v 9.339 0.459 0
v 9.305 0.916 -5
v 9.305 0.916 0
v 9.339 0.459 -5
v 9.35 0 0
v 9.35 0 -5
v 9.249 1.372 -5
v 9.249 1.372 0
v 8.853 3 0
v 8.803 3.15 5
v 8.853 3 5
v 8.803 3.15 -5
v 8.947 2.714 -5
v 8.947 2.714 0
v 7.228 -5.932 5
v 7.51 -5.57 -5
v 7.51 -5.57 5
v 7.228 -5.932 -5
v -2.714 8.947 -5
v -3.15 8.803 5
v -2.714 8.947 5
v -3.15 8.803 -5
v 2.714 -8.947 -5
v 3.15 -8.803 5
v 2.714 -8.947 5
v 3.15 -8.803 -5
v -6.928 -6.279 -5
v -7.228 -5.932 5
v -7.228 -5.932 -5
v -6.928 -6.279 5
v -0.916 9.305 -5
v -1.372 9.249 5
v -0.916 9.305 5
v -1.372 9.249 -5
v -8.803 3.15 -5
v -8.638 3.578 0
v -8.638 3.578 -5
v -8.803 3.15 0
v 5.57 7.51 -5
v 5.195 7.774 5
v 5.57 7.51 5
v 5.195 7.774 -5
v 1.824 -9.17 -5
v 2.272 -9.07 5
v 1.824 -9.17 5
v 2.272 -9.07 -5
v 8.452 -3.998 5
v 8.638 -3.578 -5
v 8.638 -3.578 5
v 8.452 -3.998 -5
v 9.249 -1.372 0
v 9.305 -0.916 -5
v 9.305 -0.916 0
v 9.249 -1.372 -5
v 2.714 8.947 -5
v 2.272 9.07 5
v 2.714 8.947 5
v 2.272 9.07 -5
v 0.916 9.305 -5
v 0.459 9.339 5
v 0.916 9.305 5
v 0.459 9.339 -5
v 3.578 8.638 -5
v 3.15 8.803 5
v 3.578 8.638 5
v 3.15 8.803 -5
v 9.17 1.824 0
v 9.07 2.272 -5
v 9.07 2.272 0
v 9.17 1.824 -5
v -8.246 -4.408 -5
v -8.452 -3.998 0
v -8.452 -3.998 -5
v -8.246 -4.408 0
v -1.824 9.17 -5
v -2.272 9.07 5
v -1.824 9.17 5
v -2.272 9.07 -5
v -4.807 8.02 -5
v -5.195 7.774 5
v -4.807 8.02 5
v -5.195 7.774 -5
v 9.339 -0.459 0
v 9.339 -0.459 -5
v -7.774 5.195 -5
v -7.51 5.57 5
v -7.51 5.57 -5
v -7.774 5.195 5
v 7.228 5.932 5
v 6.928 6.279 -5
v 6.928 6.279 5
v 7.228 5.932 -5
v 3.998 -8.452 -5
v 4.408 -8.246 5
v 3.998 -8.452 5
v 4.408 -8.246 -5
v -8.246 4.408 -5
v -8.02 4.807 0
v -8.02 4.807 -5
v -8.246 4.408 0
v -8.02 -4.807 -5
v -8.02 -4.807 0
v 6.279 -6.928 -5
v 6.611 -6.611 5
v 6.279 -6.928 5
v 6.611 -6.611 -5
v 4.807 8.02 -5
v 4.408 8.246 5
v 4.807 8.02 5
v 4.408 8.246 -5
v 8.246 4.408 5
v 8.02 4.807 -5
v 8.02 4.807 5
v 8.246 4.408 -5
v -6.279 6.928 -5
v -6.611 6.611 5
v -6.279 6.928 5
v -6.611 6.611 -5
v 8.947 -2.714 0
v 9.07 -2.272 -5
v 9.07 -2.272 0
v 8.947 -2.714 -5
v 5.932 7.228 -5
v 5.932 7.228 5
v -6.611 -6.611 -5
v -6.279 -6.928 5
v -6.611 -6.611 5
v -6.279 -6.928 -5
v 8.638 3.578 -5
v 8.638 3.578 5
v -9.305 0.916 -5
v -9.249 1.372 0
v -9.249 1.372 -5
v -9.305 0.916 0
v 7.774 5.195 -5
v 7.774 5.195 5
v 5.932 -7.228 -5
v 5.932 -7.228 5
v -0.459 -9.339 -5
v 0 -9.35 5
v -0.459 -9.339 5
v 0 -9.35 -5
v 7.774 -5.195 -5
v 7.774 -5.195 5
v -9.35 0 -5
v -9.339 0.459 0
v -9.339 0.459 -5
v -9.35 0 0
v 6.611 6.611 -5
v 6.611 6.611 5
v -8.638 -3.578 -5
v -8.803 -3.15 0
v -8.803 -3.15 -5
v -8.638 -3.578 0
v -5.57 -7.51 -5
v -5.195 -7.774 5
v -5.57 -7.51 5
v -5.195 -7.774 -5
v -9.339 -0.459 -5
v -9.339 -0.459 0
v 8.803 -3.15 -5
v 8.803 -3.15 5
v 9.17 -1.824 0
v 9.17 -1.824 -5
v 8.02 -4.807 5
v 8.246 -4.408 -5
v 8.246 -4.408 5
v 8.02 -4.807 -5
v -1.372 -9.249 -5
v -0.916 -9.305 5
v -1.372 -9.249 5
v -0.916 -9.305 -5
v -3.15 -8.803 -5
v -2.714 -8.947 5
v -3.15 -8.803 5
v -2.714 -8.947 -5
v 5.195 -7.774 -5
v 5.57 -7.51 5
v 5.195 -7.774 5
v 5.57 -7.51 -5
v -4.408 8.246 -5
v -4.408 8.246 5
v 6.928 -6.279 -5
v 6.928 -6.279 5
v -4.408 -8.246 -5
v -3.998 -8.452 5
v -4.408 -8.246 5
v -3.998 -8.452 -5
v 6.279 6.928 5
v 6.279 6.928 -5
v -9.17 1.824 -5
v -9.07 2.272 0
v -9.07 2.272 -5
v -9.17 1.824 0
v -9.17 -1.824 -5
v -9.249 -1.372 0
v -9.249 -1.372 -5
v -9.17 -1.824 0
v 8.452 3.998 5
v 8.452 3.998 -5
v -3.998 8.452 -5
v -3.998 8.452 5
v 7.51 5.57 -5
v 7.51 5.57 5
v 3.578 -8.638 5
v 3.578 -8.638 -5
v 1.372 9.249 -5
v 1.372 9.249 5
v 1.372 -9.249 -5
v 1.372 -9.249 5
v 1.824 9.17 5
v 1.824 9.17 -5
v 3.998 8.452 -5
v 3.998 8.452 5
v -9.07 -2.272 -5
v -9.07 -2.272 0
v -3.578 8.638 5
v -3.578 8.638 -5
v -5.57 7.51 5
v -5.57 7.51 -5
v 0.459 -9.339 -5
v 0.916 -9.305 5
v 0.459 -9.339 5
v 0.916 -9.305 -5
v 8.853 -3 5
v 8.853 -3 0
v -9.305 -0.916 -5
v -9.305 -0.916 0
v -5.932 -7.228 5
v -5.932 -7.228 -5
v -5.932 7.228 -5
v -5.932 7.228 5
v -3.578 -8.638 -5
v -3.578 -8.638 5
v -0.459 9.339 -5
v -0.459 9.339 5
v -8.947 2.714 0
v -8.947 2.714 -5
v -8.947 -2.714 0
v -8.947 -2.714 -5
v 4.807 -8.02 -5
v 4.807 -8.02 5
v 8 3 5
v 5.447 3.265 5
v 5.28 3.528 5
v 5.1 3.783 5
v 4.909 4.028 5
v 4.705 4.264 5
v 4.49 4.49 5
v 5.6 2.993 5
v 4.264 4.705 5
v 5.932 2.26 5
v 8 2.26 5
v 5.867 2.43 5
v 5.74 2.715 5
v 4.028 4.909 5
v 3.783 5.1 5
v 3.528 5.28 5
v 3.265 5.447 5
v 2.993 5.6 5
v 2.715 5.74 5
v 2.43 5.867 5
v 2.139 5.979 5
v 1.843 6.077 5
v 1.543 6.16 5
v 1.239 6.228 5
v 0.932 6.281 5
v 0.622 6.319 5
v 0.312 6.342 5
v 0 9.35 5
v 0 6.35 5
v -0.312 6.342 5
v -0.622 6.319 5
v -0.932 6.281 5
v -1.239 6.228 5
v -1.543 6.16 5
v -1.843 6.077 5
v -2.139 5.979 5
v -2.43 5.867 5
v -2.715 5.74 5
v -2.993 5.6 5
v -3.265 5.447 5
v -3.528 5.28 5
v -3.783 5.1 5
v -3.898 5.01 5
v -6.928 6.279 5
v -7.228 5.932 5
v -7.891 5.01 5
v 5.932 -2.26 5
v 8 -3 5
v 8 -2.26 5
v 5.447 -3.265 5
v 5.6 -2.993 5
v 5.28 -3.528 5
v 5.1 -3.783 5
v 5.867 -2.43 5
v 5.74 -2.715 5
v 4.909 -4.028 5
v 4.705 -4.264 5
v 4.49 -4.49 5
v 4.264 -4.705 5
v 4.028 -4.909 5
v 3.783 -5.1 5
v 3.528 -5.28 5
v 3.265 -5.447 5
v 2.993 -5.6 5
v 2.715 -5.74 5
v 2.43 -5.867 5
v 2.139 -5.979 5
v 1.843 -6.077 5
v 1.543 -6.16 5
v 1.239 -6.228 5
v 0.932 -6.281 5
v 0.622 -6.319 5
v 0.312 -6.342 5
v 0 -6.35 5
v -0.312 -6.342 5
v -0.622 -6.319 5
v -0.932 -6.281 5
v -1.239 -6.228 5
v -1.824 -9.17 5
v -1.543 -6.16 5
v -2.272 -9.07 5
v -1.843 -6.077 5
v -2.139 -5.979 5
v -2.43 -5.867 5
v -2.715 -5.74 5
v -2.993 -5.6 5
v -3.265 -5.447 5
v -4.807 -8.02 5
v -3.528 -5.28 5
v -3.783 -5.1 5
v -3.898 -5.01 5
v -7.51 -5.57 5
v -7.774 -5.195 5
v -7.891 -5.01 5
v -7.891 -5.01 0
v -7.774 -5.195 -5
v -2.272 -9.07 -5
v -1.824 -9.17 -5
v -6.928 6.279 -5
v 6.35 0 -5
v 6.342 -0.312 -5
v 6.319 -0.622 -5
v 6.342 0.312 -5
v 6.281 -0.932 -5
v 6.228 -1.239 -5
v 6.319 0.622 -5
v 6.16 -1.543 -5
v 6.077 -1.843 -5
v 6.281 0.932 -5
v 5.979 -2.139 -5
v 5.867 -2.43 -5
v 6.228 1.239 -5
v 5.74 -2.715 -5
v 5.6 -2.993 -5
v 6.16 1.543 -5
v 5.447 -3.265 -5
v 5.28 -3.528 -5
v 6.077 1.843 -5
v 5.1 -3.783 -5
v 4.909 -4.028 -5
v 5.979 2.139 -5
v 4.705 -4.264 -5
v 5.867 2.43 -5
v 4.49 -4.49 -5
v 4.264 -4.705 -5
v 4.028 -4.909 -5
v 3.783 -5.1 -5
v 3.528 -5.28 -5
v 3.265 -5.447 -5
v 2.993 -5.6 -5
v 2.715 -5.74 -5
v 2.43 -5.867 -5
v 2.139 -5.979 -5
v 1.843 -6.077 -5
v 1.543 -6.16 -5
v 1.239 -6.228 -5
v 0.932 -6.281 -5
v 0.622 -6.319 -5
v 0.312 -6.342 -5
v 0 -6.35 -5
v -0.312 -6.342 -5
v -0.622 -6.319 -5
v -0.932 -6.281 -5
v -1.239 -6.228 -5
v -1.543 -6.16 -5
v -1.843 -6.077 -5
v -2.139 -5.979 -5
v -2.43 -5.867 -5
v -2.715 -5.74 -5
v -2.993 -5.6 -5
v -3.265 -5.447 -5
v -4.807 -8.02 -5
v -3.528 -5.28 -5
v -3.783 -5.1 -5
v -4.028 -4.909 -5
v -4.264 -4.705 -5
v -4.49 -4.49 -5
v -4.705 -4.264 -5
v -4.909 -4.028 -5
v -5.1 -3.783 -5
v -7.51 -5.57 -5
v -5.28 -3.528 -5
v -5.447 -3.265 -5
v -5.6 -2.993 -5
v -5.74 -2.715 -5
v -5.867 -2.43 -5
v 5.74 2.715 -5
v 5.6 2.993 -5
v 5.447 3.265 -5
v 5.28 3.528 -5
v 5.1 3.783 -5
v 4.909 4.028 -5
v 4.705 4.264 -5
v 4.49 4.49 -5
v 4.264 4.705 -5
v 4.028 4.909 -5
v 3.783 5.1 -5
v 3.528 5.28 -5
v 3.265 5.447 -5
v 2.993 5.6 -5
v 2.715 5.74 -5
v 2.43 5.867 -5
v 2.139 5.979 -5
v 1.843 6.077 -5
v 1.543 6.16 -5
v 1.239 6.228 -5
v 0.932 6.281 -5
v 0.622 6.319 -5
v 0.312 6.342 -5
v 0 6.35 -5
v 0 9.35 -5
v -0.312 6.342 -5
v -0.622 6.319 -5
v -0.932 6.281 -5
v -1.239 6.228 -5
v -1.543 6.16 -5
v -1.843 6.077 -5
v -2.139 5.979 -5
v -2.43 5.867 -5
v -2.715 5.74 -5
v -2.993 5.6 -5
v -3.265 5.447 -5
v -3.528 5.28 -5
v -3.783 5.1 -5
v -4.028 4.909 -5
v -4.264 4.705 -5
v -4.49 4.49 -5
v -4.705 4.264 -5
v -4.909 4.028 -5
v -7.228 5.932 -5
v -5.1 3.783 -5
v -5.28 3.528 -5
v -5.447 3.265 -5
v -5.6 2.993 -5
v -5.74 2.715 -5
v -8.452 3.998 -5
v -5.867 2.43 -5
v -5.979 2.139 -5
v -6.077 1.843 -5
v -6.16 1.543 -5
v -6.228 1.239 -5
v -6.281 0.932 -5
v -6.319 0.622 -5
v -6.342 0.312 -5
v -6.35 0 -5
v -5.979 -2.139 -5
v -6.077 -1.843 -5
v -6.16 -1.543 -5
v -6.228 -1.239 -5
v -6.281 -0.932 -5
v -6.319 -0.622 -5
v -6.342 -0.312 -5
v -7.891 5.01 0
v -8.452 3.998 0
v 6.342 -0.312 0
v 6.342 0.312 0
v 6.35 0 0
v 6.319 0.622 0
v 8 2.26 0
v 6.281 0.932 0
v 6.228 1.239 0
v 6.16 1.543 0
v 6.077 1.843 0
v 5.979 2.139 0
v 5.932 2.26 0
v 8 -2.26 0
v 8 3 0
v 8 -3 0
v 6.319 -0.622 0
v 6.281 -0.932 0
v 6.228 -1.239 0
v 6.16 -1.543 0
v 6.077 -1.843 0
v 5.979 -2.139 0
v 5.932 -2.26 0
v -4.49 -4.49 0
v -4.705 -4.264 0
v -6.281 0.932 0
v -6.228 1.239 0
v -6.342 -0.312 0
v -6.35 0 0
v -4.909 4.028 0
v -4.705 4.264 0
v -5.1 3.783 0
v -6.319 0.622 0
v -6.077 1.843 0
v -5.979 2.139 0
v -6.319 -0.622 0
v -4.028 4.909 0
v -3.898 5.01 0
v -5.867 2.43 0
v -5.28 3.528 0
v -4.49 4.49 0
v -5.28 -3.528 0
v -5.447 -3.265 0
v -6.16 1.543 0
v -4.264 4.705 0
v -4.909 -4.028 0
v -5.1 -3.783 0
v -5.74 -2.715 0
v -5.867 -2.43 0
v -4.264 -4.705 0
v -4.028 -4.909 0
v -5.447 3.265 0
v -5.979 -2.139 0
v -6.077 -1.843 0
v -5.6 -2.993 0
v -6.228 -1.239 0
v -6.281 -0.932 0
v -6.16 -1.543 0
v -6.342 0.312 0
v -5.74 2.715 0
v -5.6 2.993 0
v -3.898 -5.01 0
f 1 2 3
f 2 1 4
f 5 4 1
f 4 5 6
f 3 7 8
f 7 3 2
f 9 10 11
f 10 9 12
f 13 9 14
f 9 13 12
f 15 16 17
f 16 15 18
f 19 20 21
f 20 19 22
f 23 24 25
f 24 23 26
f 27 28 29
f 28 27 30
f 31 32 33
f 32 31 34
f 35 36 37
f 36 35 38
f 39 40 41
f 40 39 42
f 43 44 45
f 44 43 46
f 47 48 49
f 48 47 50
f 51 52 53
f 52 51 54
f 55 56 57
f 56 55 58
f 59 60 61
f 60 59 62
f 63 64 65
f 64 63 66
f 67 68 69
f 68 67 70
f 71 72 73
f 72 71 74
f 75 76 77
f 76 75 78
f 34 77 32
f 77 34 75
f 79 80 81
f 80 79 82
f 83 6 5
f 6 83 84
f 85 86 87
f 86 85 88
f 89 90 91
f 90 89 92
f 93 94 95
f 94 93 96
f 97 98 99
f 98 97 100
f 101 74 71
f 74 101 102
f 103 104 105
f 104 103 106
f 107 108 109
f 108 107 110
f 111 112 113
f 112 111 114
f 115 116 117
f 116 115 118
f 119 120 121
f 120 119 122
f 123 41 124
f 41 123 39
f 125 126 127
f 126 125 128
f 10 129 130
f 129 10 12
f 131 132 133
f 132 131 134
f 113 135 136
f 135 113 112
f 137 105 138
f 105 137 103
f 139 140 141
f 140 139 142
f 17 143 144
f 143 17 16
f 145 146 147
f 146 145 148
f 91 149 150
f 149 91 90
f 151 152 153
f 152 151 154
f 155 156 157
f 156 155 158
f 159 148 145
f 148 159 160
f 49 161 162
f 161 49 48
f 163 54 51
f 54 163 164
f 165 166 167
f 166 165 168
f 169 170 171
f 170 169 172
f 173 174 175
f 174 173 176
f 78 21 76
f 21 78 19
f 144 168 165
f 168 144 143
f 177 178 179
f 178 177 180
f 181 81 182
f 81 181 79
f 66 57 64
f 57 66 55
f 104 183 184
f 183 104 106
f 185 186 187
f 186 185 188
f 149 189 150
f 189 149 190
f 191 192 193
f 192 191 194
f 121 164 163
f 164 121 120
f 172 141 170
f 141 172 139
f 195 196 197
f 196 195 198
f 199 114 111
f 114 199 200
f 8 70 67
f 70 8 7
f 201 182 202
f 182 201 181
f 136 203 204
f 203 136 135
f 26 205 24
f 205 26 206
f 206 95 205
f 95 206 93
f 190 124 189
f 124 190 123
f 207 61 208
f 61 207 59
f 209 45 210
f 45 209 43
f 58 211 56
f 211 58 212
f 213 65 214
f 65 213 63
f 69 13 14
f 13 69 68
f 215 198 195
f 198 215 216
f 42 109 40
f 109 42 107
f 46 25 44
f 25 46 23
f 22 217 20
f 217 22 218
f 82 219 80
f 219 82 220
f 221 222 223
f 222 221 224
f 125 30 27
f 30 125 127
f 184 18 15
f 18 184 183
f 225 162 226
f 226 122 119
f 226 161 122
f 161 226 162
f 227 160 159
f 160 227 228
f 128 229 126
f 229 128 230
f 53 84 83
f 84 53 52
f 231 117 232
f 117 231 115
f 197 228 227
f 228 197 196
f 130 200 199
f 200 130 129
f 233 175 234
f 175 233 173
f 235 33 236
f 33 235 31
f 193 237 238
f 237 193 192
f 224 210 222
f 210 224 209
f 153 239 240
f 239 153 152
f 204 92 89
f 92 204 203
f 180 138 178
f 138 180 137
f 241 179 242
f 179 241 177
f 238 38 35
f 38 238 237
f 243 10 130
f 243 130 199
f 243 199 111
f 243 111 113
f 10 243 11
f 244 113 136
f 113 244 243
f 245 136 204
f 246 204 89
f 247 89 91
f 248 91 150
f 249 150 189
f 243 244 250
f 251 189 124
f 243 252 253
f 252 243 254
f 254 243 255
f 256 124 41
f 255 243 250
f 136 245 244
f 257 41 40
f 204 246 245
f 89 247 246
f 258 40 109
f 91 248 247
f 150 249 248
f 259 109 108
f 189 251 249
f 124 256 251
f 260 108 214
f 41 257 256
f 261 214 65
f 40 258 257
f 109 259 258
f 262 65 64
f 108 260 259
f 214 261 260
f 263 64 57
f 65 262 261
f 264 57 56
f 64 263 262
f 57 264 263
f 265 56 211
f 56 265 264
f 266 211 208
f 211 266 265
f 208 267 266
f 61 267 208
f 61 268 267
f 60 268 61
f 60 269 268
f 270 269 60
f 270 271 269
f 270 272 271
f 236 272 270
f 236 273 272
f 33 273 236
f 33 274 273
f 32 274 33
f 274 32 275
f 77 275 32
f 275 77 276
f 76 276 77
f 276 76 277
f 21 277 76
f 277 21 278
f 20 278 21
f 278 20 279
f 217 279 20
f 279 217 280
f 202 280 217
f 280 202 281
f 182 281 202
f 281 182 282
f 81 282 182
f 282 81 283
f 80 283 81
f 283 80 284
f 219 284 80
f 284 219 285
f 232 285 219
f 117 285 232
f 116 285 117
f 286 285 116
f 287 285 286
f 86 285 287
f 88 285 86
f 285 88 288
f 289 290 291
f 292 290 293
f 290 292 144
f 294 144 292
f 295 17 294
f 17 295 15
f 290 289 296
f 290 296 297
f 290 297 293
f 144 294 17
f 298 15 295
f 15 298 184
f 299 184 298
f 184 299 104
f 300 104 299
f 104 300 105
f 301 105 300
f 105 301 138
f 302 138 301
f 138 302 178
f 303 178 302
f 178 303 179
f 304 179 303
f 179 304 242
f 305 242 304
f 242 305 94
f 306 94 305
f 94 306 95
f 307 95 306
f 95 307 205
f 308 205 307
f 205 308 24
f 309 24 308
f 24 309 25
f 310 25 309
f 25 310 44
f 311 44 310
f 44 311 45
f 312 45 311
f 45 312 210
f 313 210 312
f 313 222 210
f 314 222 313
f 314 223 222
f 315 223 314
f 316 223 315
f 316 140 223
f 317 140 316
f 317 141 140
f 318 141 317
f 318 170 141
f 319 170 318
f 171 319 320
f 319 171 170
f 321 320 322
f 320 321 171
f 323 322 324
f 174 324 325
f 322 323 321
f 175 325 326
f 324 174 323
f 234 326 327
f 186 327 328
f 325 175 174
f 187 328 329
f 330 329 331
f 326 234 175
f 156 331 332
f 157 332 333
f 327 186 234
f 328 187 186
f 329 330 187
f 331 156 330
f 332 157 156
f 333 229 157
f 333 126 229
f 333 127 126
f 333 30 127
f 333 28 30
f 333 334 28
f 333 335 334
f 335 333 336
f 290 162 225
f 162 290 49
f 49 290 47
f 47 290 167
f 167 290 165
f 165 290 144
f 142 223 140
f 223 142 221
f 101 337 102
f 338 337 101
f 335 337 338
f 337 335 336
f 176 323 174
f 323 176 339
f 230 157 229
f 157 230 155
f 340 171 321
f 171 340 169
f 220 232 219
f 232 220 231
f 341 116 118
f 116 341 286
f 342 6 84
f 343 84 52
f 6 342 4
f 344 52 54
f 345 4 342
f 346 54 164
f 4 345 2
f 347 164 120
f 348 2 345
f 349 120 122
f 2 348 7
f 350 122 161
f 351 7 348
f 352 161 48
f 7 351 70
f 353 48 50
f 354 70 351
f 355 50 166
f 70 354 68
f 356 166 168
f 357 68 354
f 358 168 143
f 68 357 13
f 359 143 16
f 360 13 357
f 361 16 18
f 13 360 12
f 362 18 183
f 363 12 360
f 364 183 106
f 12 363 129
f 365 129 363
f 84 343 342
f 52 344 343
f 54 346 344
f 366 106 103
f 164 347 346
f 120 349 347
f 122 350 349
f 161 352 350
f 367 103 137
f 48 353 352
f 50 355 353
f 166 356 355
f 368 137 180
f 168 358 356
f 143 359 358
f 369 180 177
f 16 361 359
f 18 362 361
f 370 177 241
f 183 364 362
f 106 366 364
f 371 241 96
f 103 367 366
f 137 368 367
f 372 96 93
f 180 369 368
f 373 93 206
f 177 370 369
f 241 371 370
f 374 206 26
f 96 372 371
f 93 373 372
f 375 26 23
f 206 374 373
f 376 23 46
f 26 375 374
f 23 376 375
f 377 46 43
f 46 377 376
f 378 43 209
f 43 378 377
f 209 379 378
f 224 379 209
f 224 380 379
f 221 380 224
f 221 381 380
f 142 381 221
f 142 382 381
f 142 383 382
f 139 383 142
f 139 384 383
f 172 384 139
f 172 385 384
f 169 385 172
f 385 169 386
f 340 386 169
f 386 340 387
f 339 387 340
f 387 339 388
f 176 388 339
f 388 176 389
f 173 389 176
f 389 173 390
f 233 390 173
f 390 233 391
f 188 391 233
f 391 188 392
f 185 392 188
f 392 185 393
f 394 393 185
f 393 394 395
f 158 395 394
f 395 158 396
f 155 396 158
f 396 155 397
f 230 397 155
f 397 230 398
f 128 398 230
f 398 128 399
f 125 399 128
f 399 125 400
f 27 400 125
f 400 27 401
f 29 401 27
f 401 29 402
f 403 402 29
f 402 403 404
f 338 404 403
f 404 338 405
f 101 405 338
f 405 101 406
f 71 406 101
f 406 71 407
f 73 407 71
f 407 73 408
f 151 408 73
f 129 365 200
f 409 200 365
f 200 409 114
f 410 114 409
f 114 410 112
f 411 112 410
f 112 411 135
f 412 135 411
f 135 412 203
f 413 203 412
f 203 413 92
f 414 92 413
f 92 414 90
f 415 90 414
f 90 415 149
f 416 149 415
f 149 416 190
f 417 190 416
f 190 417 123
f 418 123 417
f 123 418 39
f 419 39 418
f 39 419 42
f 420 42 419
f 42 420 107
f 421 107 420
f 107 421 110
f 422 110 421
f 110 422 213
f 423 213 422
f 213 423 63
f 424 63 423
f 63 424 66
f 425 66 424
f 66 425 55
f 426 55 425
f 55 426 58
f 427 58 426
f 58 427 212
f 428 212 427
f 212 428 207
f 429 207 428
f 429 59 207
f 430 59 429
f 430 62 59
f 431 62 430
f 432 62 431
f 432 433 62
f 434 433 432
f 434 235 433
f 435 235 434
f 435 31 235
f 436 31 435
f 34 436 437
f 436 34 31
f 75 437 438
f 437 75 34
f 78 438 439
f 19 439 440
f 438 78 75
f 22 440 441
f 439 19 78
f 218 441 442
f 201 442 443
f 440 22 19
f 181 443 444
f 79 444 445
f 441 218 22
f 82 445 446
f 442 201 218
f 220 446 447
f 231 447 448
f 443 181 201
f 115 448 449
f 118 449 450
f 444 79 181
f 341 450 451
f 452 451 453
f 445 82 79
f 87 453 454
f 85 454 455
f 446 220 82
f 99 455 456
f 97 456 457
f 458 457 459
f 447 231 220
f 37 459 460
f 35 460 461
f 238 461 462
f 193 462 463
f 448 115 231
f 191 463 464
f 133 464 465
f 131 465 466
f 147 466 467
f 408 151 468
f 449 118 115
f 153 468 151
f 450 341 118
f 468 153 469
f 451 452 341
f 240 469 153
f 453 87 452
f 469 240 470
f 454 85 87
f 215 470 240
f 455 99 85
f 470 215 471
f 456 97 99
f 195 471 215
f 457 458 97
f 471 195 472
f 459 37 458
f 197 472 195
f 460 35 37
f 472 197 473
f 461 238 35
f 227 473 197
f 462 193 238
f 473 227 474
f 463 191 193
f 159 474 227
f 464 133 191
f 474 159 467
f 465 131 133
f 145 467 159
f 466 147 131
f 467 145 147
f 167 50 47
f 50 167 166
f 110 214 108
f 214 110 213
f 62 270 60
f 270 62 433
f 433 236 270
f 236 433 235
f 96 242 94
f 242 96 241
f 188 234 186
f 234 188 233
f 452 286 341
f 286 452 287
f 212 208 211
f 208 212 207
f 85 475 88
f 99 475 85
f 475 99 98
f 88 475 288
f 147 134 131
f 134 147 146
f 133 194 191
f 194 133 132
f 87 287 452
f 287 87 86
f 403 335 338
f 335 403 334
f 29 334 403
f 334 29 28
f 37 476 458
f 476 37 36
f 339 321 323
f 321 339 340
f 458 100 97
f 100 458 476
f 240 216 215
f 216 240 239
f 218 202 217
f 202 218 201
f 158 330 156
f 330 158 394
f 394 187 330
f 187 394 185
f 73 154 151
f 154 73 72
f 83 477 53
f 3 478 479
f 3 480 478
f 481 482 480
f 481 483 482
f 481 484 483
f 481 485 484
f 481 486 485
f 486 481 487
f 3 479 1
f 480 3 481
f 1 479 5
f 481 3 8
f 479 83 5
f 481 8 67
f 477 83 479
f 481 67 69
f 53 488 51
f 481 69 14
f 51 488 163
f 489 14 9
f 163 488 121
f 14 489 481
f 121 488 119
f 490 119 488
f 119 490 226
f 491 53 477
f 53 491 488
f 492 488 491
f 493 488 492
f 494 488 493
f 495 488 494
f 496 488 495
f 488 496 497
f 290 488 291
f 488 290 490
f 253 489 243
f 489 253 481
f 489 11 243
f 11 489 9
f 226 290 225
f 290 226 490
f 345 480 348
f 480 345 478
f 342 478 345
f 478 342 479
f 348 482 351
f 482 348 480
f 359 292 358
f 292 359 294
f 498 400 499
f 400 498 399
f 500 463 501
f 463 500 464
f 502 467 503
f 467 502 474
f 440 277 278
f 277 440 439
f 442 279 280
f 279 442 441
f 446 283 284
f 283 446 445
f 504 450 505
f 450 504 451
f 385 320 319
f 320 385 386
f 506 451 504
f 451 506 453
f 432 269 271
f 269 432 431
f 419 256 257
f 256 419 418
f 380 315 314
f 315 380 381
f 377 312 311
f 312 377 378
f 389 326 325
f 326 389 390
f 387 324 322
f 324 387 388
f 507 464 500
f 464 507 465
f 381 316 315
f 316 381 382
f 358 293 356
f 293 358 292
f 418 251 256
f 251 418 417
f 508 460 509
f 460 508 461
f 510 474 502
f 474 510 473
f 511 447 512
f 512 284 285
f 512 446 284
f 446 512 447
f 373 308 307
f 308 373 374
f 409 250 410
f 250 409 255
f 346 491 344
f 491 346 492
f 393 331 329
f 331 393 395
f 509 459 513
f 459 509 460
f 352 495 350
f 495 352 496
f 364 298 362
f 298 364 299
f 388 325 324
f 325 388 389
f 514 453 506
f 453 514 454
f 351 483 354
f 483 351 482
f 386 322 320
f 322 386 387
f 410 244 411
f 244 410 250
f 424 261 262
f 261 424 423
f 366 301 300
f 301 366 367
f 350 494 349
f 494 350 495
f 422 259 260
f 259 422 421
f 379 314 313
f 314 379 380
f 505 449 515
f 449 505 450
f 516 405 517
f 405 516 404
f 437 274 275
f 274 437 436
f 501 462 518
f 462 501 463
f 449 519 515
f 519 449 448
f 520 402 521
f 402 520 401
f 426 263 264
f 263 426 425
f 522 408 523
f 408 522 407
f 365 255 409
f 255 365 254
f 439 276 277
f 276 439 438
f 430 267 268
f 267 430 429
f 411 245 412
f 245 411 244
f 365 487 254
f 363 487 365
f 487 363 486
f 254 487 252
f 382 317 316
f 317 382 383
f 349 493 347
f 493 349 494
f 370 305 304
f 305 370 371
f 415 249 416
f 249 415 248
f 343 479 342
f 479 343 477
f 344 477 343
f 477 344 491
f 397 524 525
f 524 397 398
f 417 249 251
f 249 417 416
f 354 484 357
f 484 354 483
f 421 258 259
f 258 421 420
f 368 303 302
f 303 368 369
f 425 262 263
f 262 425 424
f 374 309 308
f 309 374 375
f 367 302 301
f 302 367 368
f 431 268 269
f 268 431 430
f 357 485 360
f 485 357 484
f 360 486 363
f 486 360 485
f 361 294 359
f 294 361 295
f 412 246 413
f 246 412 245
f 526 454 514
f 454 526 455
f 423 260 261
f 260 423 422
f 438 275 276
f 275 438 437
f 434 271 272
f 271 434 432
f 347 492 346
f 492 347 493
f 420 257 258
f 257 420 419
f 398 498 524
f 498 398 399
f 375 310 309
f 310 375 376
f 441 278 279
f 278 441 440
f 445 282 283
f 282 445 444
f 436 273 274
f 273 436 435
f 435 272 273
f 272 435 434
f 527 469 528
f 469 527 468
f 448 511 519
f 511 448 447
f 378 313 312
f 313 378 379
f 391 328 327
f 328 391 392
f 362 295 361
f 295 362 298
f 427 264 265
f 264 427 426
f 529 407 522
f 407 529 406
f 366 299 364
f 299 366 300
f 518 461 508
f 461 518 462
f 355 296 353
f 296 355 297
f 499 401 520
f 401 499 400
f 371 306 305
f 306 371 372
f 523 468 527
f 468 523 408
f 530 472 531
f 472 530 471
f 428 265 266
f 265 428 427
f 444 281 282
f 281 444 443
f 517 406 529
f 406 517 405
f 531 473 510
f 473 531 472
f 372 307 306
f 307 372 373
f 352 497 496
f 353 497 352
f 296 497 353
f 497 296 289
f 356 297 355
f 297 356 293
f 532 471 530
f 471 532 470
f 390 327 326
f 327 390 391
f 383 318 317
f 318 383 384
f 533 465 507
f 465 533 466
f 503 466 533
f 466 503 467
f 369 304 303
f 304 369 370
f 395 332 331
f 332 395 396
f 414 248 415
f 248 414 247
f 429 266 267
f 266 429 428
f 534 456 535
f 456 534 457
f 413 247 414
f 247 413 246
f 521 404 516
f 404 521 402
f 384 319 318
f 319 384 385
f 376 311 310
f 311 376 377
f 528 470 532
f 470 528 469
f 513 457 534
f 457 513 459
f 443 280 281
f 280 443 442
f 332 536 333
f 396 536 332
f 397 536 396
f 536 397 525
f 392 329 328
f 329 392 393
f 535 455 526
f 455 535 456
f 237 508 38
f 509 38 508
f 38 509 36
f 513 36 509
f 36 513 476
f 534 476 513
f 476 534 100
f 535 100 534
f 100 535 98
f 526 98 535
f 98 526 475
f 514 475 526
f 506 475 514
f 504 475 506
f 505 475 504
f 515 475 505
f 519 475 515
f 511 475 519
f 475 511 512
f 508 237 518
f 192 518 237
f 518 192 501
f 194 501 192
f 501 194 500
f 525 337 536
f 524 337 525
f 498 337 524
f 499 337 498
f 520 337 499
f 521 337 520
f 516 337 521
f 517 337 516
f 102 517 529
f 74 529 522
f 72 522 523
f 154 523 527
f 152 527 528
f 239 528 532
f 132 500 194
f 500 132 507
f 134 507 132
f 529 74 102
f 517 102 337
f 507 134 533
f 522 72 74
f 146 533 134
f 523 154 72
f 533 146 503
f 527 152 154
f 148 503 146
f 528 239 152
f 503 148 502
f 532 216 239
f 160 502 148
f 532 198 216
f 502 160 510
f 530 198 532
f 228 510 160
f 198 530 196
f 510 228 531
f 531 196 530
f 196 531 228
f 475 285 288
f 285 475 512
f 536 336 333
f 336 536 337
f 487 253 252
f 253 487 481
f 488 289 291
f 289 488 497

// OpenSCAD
// Snap-on Clip for Lab Stand Rod and Tubing (Corrected)
// Orientation: Flat on XY plane, building upward (+Z)
// Units: Millimetres

// --- Dimensions ---
// Rod Stand Dimensions
$rod_diameter = 12.7;
$rod_wall_thickness = 3;
$rod_outer_diameter = $rod_diameter + 2 * $rod_wall_thickness; // 18.7
$rod_ring_height = 10;

// Tubing Dimensions
$tubing_diameter = 6;
$tubing_wall_thickness = 2;
$tubing_outer_diameter = $tubing_diameter + 2 * $tubing_wall_thickness; // 8
$tubing_ring_height = 10;

// Positioning
$rod_center_x = 0;
$rod_center_y = 0;
$tubing_center_x = 15;
$tubing_center_y = 0;

// Bridge Dimensions
$bridge_width_x = 4; // From x=8 to x=12
$bridge_width_y = 6;
$bridge_height = 10;
$bridge_start_x = 8;
$bridge_end_x = 12;

// Cutout Dimensions
// Rod cutout: 10mm wide, centered at y=0, on -X side
$rod_cutout_width = 10;
$rod_cutout_half_y = $rod_cutout_width / 2; // 5

// Tubing cutout: 4.5mm wide, centered at y=0, on +X side
$tubing_cutout_width = 4.5;
$tubing_cutout_half_y = $tubing_cutout_width / 2; // 2.25

// --- Configuration ---
$fn = 128; // High resolution for smooth curves and accurate hole sizes

// --- Main Body Construction ---
difference() {
    // 1. Create the solid base profile (Outer Rings + Bridge)
    // All objects are now at Z=0
    
    // Rod Outer Ring
    translate([0, 0, 0]) {
        cylinder(h = $rod_ring_height, d = $rod_outer_diameter, center = true);
    }
    
    // Tubing Outer Ring
    translate([$tubing_center_x, $tubing_center_y, 0]) {
        cylinder(h = $tubing_ring_height, d = $tubing_outer_diameter, center = true);
    }
    
    // Solid Bridge
    // Positioned at x=8 to x=12, y=-3 to y=3, z=0 to z=10
    translate([$bridge_start_x, -($bridge_width_y/2), 0]) {
        cube([$bridge_width_x, $bridge_width_y, $bridge_height]);
    }
    
    // 2. Cut out the Rod Hole (Inner Cylinder)
    // Extend slightly past the top and bottom faces to ensure clean cut
    translate([0, 0, -0.01]) 
        cylinder(h = $rod_ring_height + 0.02, d = $rod_diameter, center = true);
    
    // 3. Cut out the Tubing Hole (Inner Cylinder)
    // Extend slightly past the top and bottom faces to ensure clean cut
    translate([$tubing_center_x, $tubing_center_y, -0.01]) 
        cylinder(h = $tubing_ring_height + 0.02, d = $tubing_diameter, center = true);
    
    // 4. Cut out Rod Rectangular Opening (-X side)
    // Position: Centered at y=0, extending from x = -($rod_outer_diameter/2) to x = -($rod_outer_diameter/2) + $rod_cutout_width
    // We subtract a prism that extends slightly past the ring face to ensure the cut goes all the way through
    translate([-($rod_outer_diameter/2) - 0.5, -($rod_cutout_half_y) - 0.01, 0]) 
        cube([$rod_cutout_width + 0.02, $rod_cutout_width + 0.02, $rod_ring_height + 0.01]);
    
    // 5. Cut out Tubing Rectangular Opening (+X side)
    // Position: Centered at y=0, extending from x = $tubing_outer_diameter/2 to x = $tubing_outer_diameter/2 + $tubing_cutout_width
    translate([$tubing_outer_diameter/2 + 0.5, -($tubing_cutout_half_y) - 0.01, 0]) 
        cube([$tubing_cutout_width + 0.02, $tubing_cutout_width + 0.02, $tubing_ring_height + 0.01]);
}
